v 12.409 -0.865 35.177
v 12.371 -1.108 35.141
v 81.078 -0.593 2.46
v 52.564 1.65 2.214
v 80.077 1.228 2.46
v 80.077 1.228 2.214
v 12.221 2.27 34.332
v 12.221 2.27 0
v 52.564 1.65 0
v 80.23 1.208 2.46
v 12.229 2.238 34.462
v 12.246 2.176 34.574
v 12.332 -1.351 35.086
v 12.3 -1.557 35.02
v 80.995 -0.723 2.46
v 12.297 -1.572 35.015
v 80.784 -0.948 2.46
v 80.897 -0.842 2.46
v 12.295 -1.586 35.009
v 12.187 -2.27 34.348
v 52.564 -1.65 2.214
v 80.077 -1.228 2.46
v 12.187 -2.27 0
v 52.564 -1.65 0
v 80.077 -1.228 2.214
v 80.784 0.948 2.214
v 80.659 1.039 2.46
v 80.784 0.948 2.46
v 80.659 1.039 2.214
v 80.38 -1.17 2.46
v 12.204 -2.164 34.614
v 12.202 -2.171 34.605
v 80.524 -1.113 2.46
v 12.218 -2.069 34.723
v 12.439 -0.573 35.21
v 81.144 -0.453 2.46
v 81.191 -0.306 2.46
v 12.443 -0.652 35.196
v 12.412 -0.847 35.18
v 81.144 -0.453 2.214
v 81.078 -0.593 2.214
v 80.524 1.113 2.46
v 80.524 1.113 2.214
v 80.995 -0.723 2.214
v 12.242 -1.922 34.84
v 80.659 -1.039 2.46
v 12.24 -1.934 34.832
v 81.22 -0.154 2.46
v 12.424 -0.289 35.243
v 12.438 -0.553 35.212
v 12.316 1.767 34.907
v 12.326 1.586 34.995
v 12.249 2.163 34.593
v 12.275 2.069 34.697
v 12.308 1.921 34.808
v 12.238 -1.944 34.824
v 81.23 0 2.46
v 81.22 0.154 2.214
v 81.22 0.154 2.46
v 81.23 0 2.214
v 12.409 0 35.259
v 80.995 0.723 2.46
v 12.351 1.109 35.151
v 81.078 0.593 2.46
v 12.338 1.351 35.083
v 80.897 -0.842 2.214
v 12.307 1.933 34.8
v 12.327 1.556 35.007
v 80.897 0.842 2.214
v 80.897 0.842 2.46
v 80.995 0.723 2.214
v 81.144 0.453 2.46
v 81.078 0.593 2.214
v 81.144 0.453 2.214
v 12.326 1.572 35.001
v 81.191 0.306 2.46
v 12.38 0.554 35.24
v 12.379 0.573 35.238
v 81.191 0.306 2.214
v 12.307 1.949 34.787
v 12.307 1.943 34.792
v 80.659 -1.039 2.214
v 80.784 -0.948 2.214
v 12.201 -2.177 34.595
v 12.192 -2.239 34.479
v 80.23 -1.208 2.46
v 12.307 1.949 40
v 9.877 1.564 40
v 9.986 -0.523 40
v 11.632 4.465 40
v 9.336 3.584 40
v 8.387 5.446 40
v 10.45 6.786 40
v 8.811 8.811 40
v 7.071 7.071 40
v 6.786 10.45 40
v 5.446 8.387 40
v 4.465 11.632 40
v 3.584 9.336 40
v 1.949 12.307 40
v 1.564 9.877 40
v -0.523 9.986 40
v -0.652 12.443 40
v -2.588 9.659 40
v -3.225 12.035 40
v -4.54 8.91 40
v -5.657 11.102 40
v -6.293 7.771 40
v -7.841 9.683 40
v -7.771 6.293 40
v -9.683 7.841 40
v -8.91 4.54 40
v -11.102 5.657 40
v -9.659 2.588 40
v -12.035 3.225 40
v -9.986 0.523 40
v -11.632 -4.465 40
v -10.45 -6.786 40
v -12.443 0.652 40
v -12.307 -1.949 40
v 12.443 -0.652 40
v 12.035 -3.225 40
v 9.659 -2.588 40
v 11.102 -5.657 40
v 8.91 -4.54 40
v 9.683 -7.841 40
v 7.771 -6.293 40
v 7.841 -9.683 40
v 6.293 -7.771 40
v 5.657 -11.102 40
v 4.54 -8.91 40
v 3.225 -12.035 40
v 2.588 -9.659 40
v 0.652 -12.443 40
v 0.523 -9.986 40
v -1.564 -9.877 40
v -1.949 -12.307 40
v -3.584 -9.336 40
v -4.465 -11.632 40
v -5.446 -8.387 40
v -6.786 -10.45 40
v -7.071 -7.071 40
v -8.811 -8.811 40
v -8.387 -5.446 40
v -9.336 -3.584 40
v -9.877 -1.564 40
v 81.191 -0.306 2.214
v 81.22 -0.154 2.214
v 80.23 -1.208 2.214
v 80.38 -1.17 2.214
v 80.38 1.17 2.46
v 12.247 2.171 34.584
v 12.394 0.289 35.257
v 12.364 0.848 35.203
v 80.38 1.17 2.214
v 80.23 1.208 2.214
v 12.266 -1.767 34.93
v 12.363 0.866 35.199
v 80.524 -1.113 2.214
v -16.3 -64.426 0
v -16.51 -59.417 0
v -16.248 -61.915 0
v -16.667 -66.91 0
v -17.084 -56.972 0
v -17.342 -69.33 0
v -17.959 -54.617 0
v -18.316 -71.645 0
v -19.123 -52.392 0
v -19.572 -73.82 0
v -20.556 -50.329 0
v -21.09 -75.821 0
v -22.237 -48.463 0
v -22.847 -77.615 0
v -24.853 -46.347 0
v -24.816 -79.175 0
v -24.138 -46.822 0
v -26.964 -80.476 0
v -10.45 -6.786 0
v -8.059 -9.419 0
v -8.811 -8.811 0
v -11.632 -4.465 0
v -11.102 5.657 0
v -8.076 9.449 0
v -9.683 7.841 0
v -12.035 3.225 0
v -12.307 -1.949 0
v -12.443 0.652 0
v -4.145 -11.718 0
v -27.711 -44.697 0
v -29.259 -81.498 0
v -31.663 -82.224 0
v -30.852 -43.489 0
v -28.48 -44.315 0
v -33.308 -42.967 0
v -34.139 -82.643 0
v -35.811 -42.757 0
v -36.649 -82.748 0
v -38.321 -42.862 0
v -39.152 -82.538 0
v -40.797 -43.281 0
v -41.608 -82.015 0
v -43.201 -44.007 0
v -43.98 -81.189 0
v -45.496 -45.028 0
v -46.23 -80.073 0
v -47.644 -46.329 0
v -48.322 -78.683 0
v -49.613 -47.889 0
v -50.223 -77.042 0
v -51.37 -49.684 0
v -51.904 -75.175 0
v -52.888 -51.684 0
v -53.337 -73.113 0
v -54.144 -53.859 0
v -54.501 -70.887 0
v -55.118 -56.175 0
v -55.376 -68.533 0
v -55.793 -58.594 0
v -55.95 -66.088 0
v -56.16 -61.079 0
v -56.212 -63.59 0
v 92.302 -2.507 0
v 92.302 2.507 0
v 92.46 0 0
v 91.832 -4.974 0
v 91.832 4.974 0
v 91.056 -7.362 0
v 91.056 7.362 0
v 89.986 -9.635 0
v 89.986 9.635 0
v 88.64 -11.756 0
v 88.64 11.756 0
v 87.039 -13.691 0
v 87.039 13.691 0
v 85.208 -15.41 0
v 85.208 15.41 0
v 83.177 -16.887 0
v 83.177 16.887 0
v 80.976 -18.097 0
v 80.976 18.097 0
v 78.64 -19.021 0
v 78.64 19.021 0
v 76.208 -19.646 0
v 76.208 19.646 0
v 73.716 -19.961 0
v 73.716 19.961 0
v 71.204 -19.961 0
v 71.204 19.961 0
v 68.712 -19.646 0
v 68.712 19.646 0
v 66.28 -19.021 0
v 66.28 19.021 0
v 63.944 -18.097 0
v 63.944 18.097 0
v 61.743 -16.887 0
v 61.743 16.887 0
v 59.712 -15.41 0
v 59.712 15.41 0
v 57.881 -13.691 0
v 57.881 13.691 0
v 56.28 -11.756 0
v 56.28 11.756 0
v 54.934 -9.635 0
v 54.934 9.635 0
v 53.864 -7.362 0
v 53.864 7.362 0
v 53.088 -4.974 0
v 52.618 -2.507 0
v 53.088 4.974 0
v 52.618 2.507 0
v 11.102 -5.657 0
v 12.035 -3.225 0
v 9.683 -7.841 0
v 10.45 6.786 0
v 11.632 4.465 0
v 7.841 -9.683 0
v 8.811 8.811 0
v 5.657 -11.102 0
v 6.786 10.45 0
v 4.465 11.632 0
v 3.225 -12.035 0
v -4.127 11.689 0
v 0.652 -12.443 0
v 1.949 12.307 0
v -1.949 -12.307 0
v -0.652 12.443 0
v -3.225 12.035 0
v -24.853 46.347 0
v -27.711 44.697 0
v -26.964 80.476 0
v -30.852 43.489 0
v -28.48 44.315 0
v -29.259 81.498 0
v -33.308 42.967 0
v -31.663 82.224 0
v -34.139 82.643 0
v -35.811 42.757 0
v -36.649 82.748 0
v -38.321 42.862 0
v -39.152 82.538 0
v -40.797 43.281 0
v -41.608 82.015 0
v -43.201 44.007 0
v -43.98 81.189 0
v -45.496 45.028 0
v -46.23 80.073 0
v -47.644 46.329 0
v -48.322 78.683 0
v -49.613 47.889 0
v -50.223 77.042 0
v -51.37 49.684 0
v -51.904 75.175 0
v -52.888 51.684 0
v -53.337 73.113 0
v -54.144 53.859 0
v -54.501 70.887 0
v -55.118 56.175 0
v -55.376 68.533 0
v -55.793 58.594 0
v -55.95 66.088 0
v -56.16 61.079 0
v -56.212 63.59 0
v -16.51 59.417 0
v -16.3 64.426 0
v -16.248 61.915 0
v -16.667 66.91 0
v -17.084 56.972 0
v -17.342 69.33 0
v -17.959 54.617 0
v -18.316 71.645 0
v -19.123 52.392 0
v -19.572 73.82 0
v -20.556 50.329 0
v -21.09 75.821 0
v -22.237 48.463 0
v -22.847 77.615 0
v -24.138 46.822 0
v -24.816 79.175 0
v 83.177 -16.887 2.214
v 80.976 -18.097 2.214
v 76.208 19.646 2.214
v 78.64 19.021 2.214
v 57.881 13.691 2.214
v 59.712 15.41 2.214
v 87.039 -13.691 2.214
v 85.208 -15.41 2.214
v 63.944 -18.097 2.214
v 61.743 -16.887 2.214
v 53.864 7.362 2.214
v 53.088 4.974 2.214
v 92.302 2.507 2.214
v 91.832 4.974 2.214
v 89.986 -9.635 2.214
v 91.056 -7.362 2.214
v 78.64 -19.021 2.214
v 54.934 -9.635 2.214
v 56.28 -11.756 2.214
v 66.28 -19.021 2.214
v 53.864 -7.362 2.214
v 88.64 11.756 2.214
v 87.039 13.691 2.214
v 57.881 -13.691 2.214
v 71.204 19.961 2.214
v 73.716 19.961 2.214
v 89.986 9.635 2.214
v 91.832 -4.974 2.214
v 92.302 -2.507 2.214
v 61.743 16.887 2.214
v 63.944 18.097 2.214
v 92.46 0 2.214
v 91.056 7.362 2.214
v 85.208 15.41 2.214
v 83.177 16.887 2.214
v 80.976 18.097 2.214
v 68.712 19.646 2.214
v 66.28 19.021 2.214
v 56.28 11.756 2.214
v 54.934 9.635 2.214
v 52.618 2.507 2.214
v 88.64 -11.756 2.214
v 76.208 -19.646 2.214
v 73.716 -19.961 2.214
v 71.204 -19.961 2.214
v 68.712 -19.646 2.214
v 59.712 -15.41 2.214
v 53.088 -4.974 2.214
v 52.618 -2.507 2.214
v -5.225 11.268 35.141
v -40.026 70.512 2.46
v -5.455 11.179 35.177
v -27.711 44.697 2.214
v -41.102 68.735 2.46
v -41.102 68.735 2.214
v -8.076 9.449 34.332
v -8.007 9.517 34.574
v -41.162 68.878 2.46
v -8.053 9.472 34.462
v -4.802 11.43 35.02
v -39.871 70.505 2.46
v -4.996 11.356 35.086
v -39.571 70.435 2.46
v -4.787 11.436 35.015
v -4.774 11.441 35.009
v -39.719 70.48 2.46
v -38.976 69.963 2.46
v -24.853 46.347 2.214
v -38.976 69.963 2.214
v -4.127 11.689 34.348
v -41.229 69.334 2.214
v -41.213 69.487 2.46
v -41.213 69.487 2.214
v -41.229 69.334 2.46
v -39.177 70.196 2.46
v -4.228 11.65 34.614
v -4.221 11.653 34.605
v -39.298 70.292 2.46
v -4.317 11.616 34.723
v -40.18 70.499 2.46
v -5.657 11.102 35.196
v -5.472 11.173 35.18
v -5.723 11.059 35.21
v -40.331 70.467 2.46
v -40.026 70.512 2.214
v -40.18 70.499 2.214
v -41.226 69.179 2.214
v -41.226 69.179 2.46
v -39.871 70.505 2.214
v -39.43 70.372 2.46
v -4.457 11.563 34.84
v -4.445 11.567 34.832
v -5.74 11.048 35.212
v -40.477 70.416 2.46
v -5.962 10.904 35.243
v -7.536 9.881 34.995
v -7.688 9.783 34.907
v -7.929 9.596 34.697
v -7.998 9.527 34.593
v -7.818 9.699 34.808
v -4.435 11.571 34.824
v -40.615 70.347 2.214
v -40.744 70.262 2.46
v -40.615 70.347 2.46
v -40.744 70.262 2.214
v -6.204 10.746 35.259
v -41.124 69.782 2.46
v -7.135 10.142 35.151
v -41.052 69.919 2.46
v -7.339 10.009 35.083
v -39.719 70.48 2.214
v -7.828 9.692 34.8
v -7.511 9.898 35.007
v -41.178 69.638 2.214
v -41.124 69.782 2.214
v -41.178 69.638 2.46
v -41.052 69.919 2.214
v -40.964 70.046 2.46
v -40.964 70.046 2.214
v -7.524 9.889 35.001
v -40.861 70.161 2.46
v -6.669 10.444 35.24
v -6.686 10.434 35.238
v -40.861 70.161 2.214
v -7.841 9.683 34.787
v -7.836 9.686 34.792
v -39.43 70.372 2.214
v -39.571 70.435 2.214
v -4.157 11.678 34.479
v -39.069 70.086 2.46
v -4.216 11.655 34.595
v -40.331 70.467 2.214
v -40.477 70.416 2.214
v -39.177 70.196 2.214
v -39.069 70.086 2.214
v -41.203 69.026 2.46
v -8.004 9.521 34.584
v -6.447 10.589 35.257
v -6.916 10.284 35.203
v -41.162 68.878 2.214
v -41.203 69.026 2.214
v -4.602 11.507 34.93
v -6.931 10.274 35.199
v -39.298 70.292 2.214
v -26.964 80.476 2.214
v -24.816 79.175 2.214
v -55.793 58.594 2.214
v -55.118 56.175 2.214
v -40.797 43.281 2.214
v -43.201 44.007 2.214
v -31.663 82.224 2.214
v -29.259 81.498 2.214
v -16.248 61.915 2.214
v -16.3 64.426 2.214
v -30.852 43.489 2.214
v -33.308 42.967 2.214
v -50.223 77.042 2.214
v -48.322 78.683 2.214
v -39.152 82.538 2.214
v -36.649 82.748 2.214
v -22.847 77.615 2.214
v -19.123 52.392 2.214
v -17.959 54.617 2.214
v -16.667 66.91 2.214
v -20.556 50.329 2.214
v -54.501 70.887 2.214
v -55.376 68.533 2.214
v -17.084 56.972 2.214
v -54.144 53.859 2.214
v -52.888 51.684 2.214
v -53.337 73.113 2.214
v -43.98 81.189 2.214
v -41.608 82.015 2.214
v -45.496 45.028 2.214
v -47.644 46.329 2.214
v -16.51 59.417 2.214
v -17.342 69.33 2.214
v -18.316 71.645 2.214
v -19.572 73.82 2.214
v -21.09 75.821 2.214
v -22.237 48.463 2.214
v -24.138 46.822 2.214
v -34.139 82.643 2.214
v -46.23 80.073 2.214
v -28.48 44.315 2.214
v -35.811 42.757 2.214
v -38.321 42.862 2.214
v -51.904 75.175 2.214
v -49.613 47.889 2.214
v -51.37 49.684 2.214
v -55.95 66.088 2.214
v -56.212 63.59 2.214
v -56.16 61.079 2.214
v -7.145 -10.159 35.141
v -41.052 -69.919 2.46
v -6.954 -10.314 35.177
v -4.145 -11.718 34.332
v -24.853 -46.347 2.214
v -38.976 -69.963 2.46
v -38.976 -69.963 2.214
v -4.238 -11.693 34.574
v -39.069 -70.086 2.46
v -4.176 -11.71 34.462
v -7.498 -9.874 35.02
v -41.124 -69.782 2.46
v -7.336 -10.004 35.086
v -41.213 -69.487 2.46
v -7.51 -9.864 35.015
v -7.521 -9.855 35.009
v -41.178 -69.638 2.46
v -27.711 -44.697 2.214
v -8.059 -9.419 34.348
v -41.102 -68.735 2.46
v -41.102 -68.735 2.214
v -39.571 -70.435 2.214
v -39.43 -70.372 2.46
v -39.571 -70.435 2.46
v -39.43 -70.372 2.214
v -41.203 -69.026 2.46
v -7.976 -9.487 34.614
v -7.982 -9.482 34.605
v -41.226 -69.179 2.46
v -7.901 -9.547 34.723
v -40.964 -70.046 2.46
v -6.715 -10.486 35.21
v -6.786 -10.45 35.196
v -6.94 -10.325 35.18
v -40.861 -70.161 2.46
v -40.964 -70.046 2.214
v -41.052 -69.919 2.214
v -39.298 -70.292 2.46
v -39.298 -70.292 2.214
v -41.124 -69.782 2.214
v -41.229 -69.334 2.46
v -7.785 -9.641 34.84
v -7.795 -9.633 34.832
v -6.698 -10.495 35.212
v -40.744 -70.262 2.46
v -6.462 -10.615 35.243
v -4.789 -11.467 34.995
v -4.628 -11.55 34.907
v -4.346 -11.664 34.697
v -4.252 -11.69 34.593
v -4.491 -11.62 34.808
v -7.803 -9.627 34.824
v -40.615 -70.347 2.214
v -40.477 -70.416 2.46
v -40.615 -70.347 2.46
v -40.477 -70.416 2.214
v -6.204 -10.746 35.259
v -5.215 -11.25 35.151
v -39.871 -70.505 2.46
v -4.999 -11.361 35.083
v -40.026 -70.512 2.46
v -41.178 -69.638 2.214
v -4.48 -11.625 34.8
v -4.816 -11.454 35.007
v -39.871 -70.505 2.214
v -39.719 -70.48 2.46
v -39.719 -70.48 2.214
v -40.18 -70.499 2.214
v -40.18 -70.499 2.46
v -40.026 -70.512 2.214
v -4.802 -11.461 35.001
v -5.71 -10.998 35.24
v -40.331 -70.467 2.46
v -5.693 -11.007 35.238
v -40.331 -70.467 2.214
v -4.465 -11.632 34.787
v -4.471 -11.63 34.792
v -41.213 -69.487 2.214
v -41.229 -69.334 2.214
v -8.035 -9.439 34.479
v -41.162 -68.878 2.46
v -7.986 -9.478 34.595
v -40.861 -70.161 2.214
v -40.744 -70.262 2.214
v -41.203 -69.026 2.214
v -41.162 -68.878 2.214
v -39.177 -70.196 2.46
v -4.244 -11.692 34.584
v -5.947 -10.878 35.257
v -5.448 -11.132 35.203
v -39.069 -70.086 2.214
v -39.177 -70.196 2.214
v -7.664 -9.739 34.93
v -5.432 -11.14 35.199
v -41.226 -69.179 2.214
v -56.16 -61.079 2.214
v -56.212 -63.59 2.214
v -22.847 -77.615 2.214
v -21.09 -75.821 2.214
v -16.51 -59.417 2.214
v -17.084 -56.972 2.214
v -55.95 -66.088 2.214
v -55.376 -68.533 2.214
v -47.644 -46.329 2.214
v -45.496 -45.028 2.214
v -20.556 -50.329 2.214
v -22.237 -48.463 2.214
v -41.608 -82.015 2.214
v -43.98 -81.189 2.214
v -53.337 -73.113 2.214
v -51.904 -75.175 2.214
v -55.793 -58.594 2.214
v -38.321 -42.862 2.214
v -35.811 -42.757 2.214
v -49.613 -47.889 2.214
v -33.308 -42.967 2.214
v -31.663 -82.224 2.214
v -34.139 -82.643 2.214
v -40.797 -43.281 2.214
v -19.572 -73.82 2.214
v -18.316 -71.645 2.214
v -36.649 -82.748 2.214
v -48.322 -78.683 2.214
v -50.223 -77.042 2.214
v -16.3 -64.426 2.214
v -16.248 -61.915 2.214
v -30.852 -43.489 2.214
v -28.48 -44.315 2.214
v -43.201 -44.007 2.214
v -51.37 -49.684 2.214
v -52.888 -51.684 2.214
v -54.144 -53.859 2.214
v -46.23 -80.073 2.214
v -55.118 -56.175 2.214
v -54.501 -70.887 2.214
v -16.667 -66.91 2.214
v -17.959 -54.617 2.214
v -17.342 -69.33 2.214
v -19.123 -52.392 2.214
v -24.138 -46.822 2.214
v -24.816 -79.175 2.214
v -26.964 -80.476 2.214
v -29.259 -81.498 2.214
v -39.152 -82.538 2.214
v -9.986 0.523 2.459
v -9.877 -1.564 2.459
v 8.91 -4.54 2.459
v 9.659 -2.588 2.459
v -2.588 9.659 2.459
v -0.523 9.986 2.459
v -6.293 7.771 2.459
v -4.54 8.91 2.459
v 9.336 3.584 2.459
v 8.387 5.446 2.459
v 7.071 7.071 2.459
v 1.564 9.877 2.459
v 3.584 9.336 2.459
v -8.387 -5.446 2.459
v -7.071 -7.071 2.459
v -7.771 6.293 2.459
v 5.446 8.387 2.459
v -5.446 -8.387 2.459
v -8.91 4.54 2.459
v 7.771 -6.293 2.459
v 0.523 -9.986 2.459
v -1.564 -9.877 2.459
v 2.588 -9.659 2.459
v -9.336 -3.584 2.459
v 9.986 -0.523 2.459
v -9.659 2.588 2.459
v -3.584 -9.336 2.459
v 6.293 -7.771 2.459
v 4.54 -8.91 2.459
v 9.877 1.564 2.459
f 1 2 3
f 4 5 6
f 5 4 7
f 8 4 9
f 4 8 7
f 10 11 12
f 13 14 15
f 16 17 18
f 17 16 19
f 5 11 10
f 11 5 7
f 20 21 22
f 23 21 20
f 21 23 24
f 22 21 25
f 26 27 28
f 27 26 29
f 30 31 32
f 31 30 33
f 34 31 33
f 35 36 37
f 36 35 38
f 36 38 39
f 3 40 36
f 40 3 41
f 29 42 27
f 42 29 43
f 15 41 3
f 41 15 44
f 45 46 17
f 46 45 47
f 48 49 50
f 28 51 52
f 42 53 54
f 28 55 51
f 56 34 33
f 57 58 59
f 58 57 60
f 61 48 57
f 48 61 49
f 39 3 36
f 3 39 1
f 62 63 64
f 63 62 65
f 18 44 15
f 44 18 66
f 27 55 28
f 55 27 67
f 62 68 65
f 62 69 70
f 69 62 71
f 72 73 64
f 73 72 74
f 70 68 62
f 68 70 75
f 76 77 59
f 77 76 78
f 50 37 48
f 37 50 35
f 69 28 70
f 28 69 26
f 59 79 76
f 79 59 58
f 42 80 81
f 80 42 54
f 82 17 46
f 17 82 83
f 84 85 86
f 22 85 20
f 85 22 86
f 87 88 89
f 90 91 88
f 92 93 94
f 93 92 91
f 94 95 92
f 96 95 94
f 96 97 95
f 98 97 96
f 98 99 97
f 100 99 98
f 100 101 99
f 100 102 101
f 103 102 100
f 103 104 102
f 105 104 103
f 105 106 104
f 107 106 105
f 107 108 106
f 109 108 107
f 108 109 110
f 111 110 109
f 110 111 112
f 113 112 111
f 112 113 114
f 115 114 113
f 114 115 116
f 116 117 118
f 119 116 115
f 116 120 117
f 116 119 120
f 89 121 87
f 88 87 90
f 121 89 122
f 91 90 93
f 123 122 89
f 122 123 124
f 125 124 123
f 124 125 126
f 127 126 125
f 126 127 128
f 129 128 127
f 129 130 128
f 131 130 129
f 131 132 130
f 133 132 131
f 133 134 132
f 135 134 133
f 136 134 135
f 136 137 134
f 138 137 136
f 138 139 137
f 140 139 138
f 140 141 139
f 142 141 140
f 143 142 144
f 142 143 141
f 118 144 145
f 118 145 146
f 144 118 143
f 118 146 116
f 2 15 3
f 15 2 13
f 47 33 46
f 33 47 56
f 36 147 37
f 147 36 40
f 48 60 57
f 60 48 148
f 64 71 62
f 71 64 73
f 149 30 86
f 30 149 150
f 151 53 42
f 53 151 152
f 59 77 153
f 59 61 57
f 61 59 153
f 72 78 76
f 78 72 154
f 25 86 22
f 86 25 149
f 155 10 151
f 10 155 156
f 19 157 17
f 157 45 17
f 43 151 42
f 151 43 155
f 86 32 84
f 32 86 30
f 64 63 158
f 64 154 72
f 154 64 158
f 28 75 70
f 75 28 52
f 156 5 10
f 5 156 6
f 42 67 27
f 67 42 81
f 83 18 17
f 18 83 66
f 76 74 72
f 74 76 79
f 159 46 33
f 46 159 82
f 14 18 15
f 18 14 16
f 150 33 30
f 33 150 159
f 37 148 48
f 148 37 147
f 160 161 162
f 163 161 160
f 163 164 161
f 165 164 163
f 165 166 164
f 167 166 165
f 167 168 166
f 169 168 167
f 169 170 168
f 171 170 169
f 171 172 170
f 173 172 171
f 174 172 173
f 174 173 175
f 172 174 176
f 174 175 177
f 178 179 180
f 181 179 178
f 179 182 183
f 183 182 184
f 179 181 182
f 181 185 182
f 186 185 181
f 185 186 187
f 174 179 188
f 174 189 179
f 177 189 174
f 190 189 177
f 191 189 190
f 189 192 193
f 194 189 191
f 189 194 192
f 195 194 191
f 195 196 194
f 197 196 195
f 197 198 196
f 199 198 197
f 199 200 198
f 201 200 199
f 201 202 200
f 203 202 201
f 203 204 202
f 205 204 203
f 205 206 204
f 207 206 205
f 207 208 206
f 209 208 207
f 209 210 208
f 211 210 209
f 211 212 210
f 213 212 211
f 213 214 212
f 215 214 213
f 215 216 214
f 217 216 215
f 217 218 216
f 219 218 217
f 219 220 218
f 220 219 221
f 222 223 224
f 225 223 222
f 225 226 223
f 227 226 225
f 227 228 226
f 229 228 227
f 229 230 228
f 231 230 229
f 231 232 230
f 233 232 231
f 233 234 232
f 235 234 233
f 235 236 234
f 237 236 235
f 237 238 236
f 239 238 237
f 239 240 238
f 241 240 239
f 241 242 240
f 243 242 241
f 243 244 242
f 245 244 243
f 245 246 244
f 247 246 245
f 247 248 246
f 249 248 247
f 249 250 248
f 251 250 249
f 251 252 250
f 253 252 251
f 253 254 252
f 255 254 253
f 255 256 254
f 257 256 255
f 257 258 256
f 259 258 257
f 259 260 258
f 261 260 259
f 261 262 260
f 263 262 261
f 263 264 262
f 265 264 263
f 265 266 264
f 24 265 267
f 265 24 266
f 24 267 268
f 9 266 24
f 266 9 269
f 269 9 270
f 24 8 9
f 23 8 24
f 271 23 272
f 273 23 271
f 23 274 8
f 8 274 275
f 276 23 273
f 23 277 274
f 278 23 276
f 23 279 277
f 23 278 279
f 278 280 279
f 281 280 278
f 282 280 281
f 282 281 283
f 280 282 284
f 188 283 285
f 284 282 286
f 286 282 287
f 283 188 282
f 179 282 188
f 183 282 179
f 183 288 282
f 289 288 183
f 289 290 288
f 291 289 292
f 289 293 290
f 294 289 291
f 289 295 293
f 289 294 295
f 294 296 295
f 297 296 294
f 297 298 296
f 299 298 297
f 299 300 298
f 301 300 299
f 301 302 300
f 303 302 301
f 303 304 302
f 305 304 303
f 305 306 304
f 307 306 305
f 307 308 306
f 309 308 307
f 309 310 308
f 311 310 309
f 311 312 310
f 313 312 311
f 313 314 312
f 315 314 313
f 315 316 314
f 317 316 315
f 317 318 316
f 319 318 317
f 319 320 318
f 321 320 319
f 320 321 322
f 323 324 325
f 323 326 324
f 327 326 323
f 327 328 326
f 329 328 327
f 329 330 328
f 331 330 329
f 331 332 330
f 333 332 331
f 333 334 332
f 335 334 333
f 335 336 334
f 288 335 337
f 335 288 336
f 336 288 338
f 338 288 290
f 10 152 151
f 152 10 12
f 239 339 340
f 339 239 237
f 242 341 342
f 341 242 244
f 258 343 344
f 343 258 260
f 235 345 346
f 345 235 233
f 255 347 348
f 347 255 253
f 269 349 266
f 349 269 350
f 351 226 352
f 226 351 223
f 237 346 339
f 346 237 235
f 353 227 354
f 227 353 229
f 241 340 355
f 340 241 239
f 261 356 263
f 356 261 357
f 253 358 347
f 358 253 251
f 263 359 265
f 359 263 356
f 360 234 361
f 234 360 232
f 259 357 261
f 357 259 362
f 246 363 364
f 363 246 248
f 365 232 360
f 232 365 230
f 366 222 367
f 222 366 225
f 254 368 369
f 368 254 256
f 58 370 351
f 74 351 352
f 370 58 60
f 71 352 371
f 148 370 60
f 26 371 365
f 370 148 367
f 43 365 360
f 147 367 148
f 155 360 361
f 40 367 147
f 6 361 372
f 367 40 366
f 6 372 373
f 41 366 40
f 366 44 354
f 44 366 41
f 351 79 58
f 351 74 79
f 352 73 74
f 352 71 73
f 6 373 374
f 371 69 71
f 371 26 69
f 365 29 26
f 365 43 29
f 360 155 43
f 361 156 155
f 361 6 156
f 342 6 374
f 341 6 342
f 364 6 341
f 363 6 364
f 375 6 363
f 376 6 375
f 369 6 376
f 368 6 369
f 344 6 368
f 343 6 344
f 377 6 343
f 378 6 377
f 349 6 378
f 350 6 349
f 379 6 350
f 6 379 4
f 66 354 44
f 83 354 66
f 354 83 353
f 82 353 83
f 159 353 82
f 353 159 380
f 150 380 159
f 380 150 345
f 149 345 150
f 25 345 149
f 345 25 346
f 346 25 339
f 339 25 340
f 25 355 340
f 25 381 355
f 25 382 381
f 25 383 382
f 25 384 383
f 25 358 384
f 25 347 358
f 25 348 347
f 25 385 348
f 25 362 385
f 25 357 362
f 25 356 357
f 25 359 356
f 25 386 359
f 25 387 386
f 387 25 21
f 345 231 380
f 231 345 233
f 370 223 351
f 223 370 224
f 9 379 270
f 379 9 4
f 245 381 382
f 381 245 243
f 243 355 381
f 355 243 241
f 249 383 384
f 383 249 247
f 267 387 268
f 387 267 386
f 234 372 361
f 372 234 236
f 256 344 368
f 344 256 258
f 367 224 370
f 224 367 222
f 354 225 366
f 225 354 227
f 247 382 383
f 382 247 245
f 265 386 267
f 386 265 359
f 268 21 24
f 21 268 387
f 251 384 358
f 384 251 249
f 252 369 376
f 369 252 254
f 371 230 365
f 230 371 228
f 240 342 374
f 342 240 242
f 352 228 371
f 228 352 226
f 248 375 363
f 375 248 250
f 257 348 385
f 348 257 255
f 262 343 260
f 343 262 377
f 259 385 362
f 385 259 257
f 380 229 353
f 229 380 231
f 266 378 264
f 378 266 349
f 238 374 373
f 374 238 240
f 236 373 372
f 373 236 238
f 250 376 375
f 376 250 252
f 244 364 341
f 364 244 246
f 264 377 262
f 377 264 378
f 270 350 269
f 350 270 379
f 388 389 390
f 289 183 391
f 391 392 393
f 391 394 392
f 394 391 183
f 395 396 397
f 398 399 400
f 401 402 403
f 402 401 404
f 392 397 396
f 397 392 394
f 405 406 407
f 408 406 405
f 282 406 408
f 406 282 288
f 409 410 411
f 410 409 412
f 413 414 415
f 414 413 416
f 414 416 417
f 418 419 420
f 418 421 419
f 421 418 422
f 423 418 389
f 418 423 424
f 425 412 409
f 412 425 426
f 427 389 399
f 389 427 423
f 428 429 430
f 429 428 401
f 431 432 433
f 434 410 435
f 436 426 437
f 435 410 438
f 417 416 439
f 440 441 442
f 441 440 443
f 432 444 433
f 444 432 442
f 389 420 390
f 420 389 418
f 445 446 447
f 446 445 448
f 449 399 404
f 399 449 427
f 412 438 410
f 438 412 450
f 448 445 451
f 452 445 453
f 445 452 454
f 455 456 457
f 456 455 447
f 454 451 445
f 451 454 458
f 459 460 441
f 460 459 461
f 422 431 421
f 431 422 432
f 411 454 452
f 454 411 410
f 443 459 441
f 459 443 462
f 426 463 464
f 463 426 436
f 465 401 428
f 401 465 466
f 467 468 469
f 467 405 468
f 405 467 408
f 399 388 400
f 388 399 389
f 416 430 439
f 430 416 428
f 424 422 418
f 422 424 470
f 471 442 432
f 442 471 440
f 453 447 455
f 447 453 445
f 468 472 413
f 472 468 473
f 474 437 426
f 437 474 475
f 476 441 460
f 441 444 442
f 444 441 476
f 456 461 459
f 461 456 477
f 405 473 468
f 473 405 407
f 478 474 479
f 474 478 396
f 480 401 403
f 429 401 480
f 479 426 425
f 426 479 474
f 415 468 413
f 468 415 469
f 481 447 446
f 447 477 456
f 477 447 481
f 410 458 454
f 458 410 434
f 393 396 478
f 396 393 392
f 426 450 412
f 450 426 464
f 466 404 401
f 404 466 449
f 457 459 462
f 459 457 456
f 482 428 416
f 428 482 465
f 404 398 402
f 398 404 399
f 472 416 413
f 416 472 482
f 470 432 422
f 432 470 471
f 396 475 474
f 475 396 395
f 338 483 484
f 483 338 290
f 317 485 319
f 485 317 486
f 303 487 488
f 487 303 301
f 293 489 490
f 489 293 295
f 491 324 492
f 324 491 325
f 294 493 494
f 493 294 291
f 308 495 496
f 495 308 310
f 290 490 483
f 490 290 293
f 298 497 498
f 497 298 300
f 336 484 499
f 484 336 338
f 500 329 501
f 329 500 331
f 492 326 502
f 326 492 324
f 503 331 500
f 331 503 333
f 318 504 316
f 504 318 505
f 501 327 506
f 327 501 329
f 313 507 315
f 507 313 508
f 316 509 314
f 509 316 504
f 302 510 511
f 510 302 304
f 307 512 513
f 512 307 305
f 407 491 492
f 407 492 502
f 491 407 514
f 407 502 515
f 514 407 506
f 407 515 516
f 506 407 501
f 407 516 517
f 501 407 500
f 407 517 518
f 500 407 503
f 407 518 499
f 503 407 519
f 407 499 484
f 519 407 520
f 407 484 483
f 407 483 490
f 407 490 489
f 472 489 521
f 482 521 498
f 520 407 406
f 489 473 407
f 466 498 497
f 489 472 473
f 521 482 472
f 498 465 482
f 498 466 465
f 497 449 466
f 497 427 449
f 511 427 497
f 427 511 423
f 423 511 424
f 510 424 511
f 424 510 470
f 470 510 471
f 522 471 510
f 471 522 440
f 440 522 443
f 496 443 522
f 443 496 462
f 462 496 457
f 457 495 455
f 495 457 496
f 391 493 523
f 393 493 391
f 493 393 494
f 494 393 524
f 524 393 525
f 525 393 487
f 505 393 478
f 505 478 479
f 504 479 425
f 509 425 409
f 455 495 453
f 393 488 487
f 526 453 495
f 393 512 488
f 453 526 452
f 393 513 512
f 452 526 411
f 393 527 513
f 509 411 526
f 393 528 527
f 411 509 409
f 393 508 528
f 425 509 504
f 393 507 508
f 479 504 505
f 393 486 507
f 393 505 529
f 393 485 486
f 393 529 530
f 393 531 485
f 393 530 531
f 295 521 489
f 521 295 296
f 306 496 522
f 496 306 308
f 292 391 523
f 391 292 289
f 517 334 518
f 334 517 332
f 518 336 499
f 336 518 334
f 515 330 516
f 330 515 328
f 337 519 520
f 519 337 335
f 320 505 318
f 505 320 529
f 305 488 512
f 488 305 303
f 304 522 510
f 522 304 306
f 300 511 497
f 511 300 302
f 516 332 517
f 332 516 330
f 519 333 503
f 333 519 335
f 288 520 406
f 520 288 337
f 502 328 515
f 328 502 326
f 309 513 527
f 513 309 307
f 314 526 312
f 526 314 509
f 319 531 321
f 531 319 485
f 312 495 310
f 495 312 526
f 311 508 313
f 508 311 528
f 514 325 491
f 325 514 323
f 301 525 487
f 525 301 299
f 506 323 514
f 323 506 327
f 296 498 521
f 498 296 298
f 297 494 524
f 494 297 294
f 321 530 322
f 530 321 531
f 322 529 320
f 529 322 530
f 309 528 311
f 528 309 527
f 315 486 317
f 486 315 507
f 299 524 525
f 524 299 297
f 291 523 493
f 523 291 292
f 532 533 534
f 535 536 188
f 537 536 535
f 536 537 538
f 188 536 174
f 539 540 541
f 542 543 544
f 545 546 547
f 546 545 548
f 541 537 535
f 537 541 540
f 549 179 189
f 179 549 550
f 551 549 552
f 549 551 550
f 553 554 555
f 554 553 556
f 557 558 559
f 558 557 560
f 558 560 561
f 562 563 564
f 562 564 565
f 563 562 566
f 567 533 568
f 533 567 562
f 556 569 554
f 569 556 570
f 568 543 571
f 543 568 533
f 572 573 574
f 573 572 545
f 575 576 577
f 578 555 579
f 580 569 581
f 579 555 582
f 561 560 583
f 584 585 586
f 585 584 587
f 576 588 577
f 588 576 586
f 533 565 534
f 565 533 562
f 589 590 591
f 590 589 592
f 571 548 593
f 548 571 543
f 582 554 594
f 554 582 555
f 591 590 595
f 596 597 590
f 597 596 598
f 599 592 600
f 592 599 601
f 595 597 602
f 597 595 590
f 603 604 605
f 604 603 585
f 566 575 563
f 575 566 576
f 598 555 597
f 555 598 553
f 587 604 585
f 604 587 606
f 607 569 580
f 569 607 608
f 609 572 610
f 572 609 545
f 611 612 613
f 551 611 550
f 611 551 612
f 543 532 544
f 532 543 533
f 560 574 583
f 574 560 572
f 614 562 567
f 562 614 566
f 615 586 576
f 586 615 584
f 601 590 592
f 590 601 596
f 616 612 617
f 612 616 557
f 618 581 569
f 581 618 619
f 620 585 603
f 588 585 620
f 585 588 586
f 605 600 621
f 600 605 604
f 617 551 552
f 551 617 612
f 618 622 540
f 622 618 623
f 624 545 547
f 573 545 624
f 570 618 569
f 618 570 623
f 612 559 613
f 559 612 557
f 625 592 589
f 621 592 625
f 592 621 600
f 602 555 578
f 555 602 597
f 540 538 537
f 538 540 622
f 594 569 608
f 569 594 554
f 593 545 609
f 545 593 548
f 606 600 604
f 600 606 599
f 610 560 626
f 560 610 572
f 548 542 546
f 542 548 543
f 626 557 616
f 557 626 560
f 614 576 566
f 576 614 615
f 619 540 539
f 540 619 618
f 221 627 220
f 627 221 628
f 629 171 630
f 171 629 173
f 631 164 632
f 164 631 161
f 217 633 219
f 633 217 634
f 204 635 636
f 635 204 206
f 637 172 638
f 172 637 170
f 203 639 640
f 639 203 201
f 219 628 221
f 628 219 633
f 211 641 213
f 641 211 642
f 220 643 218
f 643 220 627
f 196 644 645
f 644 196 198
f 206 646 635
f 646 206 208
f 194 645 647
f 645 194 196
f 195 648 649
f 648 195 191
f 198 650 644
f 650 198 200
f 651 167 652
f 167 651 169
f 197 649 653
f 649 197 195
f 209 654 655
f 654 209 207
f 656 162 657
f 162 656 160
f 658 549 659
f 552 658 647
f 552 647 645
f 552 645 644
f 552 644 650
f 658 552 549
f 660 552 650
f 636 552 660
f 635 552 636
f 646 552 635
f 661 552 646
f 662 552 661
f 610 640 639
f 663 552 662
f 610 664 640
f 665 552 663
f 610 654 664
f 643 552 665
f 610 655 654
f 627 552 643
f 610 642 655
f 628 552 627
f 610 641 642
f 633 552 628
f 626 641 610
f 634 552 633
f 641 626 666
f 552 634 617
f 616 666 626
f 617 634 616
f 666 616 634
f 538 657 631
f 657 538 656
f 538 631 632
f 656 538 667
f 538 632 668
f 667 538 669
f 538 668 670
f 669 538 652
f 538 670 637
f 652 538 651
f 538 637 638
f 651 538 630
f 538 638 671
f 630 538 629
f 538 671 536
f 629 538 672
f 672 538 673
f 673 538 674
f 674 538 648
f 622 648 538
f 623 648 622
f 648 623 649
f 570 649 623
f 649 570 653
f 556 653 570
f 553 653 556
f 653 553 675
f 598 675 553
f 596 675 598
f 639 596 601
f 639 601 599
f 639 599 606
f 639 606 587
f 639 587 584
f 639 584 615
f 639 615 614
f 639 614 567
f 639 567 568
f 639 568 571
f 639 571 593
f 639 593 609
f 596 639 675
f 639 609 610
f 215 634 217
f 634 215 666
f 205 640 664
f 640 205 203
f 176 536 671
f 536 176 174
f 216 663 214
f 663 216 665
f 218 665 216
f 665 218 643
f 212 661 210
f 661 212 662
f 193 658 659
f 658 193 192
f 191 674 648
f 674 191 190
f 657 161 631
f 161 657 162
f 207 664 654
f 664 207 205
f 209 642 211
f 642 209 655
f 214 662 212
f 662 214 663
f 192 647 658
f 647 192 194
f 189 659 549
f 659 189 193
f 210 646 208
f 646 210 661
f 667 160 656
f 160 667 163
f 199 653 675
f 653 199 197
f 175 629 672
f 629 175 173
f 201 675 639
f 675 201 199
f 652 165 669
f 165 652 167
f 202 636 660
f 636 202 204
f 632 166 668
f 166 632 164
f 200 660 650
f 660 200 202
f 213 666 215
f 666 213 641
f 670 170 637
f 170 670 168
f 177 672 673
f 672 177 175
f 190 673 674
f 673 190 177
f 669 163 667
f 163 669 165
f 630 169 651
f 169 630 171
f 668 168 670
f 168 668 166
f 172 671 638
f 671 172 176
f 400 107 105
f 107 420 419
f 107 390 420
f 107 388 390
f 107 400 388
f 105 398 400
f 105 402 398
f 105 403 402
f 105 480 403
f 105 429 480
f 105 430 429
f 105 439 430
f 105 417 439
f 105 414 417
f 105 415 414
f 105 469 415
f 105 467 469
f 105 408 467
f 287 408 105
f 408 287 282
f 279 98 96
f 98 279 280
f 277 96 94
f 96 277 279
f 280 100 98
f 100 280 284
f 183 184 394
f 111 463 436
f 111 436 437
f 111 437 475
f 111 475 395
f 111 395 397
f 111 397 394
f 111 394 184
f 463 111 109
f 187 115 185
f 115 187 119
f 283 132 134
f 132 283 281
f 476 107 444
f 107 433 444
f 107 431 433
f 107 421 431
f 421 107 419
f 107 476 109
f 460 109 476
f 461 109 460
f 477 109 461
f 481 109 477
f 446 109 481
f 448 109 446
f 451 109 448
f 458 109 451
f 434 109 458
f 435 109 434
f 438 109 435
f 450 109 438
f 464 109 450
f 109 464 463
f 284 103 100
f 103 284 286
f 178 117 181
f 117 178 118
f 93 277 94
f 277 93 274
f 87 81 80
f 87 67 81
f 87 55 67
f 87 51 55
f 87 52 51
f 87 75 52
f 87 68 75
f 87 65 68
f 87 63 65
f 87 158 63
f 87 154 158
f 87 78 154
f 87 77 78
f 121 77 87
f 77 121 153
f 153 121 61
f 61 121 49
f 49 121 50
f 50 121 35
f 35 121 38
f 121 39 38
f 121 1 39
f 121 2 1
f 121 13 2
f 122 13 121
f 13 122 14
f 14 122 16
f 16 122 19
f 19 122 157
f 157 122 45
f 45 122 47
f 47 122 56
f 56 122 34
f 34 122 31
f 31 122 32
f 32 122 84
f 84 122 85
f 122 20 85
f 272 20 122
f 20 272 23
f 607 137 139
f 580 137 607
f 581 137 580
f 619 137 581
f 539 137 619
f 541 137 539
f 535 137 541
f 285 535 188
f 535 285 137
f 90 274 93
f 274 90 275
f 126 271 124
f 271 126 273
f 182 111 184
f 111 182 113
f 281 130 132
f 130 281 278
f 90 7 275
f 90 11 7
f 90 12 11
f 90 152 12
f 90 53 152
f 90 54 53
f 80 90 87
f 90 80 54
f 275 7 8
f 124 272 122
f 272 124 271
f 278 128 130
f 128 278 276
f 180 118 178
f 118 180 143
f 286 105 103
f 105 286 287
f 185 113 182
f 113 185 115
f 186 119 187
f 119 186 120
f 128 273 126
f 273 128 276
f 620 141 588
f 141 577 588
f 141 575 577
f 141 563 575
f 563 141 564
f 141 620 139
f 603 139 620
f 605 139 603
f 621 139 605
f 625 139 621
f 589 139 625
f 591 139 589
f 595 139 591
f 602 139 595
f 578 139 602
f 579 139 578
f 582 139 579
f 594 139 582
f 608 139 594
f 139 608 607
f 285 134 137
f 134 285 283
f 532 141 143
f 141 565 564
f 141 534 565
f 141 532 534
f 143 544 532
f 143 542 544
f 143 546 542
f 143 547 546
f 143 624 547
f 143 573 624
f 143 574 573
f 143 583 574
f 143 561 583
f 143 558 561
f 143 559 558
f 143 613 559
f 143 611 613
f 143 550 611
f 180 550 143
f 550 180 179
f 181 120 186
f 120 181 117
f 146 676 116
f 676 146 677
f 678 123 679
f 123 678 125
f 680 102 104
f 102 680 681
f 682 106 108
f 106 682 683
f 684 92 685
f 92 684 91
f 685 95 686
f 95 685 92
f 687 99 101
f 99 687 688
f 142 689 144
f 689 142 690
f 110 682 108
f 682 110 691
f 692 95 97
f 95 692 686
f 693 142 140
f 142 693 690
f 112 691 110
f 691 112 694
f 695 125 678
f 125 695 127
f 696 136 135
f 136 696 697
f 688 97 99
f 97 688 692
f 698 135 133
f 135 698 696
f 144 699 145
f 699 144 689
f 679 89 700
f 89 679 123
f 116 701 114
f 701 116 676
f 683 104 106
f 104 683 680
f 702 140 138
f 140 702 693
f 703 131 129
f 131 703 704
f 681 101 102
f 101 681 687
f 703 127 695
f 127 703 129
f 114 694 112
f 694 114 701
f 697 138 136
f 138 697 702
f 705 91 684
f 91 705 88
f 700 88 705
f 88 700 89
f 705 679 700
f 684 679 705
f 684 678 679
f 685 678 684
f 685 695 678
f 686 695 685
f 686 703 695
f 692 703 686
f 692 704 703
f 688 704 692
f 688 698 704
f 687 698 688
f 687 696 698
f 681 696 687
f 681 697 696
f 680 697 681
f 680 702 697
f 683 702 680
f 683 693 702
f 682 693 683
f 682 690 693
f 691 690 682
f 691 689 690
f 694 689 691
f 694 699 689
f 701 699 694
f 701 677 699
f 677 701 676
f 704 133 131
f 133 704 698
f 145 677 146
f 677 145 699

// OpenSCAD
// Rod Tripod
// Design by Marius Gheorghescu, December 2017

// diameter of the rod or diagonal (!) or the square rod
rod_dia = 20.0;

// length of a leg 
size = 80;

// thickness of the legs (recommended: minimum 6x extrusion width)
wall_thickness = 2.46;

// has round pads at the end of legs (0:off, 0.1-0.2: breakable, 1.0: full)
leg_pads = 0.9;

// set to 1 to re-inforce the legs 
extra_strong = 0.0;

// ratio of height to leg length (0.5 recommended)
height_ratio = 0.5;

// set to closed bottom
closed_bottom = 1;

// set to 1 if square rod
square_rod = 0;

/* [Hidden] */

height = size * height_ratio;
epsilon = 0.001;

module leg(leg_pads)
{
    $fn = 50;
    
    union() {
        hull() {
            translate([0,0, height/2])
                cylinder(r=min(wall_thickness,rod_dia/2), h=height, center=true);
            
            translate([size,0,wall_thickness/2])
                cylinder(r=wall_thickness/2, h=wall_thickness, center=true);
        }

        hull() {
            translate([size - rod_dia/2 + wall_thickness,0,wall_thickness/2*leg_pads])
                cylinder(r=min(size/4, rod_dia), h=wall_thickness*leg_pads, center=true);        
        
            if (extra_strong) {
                translate([0,0, height - wall_thickness/2 - epsilon])
                    cylinder(r=(rod_dia + 2*wall_thickness)/2, h=wall_thickness, center=true);
                
                translate([0,0, wall_thickness/2])
                    cylinder(r=wall_thickness/2, h=wall_thickness, center=true);
            }
        }
        
    }

}

difference() {

    $fn=square_rod?4:30;

    // legs 
    union() {

        // center rod support
        translate([0,0, height/2])
            rotate([0,0,45])
            cylinder(r=(rod_dia/2 + wall_thickness), h=height, center=true);
        
        leg(leg_pads);
        
        rotate([0,0,120])
            leg(leg_pads);
        
        rotate([0,0,-120])
            leg(leg_pads);
    }
    
    // rod 
    translate([0,0, height/2 + closed_bottom*wall_thickness])
        rotate([0,0,45])
        cylinder(r=rod_dia/2, h=height + epsilon, center=true);
    
}


//%translate([0,0,100/2])cube([8,8,100], center=true);
